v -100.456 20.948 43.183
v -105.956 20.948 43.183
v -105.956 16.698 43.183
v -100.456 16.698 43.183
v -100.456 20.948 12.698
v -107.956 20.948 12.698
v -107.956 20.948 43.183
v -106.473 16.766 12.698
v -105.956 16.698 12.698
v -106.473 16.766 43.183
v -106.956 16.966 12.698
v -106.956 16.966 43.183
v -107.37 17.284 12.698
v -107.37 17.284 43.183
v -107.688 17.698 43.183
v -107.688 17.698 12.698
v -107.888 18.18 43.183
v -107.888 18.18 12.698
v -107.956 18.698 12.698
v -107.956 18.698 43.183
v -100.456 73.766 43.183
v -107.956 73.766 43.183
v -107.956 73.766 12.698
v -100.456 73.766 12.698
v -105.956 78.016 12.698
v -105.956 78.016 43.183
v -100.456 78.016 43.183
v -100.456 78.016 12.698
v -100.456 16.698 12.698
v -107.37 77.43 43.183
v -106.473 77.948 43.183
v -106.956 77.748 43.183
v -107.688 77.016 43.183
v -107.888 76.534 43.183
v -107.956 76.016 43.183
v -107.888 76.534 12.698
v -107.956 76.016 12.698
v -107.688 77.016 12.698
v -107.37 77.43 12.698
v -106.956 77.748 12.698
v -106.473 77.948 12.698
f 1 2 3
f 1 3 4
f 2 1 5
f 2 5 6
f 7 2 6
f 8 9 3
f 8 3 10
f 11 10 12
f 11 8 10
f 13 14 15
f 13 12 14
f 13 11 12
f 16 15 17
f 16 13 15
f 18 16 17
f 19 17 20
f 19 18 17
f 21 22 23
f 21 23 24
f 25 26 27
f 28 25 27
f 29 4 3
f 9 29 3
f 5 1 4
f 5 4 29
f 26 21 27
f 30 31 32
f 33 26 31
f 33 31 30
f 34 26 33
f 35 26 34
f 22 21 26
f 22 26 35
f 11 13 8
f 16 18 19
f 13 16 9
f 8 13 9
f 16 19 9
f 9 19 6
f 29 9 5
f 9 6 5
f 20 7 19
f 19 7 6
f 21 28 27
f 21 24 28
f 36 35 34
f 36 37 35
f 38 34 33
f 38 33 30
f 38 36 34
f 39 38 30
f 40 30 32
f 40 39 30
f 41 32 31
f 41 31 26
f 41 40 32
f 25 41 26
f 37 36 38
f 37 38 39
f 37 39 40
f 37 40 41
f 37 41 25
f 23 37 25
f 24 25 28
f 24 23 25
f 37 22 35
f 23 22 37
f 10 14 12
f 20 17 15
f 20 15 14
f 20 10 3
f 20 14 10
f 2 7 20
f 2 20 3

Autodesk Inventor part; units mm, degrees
ref_plane "YZ Plane" through (0, 0, 0) normal (1, 0, 0) x (0, 1, 0)
ref_plane "XZ Plane" through (0, 0, 0) normal (0, 1, 0) x (-1, 0, 0)
ref_plane "XY Plane" through (0, 0, 0) normal (0, 0, 1) x (1, 0, 0)
sketch "Sketch2" plane through (-107.95, 73.766, 12.698) normal (0, -1, 0) x (1, 0, 0)
  line L0 (4.0161, 30.485) -> (-0.0057, 30.485) construction
  line L1 (-0.0057, 0) -> (4.0161, 0) construction
  line L2 (-0.0057, 30.485) -> (-0.0057, 0)
  line L3 (-0.0057, 0) -> (7.4943, 0)
  line L4 (7.4943, 0) -> (7.4943, 30.485)
  line L5 (7.4943, 30.485) -> (-0.0057, 30.485)
  point P0 (107.95, -12.698)
  dimension "d0" = 7.5
extrude "Extrusion1" add sketch "Sketch2" against normal blind 4.25
fillet "Fillet1" radius 2 1 edges at (-107.9557, 78.016, 27.9405)
sketch "Sketch4" plane through (-75.404, 20.948, 12.698) normal (0, 1, 0) x (-1, 0, 0)
  line L0 (32.5517, 30.485) -> (32.5517, 0) projected
  line L1 (32.5517, 0) -> (32.5517, 30.485)
  line L2 (30.5517, 30.485) -> (25.0517, 30.485) projected
  line L3 (32.5517, 30.485) -> (25.0517, 30.485)
  line L4 (25.0517, 30.485) -> (25.0517, 0)
  line L5 (32.5517, 0) -> (25.0517, 0) projected
  line L6 (25.0517, 0) -> (32.5517, 0)
  point P0 (-75.404, -12.698)
extrude "Extrusion2" add sketch "Sketch4" against normal blind 4.25
fillet "Fillet2" radius 2 1 edges at (-107.9557, 16.698, 27.9405)
sketch "Sketch5" plane through (29.71, 53.248, 16.384) normal (1, 0, 0) x (0, 1, 0)
  line L0 (-32.585, -16.384) -> (20.803, -16.384) projected
  line L1 (24.803, -12.384) -> (24.803, 37.716) projected
  line L2 (20.803, 41.716) -> (-32.585, 41.716) projected
  line L3 (-36.585, 37.716) -> (-36.585, -12.384) projected
  line L4 (20.803, -16.384) -> (20.803, -10.7245) construction
  line L5 (20.803, -16.384) -> (26.4625, -16.384) construction
  line L6 (24.803, -12.384) -> (20.803, -12.384) construction
  line L7 (24.803, -12.384) -> (28.803, -12.384) construction
  arc A0 (20.803, -16.384) -> (24.803, -12.384) centre (20.803, -12.384) ccw
  point P0 (-53.248, -16.384)
  dimension "d7" = 90
  dimension "d8" = 180
  dimension "d9" = 8
properties part number "vertical_battery_holder"
